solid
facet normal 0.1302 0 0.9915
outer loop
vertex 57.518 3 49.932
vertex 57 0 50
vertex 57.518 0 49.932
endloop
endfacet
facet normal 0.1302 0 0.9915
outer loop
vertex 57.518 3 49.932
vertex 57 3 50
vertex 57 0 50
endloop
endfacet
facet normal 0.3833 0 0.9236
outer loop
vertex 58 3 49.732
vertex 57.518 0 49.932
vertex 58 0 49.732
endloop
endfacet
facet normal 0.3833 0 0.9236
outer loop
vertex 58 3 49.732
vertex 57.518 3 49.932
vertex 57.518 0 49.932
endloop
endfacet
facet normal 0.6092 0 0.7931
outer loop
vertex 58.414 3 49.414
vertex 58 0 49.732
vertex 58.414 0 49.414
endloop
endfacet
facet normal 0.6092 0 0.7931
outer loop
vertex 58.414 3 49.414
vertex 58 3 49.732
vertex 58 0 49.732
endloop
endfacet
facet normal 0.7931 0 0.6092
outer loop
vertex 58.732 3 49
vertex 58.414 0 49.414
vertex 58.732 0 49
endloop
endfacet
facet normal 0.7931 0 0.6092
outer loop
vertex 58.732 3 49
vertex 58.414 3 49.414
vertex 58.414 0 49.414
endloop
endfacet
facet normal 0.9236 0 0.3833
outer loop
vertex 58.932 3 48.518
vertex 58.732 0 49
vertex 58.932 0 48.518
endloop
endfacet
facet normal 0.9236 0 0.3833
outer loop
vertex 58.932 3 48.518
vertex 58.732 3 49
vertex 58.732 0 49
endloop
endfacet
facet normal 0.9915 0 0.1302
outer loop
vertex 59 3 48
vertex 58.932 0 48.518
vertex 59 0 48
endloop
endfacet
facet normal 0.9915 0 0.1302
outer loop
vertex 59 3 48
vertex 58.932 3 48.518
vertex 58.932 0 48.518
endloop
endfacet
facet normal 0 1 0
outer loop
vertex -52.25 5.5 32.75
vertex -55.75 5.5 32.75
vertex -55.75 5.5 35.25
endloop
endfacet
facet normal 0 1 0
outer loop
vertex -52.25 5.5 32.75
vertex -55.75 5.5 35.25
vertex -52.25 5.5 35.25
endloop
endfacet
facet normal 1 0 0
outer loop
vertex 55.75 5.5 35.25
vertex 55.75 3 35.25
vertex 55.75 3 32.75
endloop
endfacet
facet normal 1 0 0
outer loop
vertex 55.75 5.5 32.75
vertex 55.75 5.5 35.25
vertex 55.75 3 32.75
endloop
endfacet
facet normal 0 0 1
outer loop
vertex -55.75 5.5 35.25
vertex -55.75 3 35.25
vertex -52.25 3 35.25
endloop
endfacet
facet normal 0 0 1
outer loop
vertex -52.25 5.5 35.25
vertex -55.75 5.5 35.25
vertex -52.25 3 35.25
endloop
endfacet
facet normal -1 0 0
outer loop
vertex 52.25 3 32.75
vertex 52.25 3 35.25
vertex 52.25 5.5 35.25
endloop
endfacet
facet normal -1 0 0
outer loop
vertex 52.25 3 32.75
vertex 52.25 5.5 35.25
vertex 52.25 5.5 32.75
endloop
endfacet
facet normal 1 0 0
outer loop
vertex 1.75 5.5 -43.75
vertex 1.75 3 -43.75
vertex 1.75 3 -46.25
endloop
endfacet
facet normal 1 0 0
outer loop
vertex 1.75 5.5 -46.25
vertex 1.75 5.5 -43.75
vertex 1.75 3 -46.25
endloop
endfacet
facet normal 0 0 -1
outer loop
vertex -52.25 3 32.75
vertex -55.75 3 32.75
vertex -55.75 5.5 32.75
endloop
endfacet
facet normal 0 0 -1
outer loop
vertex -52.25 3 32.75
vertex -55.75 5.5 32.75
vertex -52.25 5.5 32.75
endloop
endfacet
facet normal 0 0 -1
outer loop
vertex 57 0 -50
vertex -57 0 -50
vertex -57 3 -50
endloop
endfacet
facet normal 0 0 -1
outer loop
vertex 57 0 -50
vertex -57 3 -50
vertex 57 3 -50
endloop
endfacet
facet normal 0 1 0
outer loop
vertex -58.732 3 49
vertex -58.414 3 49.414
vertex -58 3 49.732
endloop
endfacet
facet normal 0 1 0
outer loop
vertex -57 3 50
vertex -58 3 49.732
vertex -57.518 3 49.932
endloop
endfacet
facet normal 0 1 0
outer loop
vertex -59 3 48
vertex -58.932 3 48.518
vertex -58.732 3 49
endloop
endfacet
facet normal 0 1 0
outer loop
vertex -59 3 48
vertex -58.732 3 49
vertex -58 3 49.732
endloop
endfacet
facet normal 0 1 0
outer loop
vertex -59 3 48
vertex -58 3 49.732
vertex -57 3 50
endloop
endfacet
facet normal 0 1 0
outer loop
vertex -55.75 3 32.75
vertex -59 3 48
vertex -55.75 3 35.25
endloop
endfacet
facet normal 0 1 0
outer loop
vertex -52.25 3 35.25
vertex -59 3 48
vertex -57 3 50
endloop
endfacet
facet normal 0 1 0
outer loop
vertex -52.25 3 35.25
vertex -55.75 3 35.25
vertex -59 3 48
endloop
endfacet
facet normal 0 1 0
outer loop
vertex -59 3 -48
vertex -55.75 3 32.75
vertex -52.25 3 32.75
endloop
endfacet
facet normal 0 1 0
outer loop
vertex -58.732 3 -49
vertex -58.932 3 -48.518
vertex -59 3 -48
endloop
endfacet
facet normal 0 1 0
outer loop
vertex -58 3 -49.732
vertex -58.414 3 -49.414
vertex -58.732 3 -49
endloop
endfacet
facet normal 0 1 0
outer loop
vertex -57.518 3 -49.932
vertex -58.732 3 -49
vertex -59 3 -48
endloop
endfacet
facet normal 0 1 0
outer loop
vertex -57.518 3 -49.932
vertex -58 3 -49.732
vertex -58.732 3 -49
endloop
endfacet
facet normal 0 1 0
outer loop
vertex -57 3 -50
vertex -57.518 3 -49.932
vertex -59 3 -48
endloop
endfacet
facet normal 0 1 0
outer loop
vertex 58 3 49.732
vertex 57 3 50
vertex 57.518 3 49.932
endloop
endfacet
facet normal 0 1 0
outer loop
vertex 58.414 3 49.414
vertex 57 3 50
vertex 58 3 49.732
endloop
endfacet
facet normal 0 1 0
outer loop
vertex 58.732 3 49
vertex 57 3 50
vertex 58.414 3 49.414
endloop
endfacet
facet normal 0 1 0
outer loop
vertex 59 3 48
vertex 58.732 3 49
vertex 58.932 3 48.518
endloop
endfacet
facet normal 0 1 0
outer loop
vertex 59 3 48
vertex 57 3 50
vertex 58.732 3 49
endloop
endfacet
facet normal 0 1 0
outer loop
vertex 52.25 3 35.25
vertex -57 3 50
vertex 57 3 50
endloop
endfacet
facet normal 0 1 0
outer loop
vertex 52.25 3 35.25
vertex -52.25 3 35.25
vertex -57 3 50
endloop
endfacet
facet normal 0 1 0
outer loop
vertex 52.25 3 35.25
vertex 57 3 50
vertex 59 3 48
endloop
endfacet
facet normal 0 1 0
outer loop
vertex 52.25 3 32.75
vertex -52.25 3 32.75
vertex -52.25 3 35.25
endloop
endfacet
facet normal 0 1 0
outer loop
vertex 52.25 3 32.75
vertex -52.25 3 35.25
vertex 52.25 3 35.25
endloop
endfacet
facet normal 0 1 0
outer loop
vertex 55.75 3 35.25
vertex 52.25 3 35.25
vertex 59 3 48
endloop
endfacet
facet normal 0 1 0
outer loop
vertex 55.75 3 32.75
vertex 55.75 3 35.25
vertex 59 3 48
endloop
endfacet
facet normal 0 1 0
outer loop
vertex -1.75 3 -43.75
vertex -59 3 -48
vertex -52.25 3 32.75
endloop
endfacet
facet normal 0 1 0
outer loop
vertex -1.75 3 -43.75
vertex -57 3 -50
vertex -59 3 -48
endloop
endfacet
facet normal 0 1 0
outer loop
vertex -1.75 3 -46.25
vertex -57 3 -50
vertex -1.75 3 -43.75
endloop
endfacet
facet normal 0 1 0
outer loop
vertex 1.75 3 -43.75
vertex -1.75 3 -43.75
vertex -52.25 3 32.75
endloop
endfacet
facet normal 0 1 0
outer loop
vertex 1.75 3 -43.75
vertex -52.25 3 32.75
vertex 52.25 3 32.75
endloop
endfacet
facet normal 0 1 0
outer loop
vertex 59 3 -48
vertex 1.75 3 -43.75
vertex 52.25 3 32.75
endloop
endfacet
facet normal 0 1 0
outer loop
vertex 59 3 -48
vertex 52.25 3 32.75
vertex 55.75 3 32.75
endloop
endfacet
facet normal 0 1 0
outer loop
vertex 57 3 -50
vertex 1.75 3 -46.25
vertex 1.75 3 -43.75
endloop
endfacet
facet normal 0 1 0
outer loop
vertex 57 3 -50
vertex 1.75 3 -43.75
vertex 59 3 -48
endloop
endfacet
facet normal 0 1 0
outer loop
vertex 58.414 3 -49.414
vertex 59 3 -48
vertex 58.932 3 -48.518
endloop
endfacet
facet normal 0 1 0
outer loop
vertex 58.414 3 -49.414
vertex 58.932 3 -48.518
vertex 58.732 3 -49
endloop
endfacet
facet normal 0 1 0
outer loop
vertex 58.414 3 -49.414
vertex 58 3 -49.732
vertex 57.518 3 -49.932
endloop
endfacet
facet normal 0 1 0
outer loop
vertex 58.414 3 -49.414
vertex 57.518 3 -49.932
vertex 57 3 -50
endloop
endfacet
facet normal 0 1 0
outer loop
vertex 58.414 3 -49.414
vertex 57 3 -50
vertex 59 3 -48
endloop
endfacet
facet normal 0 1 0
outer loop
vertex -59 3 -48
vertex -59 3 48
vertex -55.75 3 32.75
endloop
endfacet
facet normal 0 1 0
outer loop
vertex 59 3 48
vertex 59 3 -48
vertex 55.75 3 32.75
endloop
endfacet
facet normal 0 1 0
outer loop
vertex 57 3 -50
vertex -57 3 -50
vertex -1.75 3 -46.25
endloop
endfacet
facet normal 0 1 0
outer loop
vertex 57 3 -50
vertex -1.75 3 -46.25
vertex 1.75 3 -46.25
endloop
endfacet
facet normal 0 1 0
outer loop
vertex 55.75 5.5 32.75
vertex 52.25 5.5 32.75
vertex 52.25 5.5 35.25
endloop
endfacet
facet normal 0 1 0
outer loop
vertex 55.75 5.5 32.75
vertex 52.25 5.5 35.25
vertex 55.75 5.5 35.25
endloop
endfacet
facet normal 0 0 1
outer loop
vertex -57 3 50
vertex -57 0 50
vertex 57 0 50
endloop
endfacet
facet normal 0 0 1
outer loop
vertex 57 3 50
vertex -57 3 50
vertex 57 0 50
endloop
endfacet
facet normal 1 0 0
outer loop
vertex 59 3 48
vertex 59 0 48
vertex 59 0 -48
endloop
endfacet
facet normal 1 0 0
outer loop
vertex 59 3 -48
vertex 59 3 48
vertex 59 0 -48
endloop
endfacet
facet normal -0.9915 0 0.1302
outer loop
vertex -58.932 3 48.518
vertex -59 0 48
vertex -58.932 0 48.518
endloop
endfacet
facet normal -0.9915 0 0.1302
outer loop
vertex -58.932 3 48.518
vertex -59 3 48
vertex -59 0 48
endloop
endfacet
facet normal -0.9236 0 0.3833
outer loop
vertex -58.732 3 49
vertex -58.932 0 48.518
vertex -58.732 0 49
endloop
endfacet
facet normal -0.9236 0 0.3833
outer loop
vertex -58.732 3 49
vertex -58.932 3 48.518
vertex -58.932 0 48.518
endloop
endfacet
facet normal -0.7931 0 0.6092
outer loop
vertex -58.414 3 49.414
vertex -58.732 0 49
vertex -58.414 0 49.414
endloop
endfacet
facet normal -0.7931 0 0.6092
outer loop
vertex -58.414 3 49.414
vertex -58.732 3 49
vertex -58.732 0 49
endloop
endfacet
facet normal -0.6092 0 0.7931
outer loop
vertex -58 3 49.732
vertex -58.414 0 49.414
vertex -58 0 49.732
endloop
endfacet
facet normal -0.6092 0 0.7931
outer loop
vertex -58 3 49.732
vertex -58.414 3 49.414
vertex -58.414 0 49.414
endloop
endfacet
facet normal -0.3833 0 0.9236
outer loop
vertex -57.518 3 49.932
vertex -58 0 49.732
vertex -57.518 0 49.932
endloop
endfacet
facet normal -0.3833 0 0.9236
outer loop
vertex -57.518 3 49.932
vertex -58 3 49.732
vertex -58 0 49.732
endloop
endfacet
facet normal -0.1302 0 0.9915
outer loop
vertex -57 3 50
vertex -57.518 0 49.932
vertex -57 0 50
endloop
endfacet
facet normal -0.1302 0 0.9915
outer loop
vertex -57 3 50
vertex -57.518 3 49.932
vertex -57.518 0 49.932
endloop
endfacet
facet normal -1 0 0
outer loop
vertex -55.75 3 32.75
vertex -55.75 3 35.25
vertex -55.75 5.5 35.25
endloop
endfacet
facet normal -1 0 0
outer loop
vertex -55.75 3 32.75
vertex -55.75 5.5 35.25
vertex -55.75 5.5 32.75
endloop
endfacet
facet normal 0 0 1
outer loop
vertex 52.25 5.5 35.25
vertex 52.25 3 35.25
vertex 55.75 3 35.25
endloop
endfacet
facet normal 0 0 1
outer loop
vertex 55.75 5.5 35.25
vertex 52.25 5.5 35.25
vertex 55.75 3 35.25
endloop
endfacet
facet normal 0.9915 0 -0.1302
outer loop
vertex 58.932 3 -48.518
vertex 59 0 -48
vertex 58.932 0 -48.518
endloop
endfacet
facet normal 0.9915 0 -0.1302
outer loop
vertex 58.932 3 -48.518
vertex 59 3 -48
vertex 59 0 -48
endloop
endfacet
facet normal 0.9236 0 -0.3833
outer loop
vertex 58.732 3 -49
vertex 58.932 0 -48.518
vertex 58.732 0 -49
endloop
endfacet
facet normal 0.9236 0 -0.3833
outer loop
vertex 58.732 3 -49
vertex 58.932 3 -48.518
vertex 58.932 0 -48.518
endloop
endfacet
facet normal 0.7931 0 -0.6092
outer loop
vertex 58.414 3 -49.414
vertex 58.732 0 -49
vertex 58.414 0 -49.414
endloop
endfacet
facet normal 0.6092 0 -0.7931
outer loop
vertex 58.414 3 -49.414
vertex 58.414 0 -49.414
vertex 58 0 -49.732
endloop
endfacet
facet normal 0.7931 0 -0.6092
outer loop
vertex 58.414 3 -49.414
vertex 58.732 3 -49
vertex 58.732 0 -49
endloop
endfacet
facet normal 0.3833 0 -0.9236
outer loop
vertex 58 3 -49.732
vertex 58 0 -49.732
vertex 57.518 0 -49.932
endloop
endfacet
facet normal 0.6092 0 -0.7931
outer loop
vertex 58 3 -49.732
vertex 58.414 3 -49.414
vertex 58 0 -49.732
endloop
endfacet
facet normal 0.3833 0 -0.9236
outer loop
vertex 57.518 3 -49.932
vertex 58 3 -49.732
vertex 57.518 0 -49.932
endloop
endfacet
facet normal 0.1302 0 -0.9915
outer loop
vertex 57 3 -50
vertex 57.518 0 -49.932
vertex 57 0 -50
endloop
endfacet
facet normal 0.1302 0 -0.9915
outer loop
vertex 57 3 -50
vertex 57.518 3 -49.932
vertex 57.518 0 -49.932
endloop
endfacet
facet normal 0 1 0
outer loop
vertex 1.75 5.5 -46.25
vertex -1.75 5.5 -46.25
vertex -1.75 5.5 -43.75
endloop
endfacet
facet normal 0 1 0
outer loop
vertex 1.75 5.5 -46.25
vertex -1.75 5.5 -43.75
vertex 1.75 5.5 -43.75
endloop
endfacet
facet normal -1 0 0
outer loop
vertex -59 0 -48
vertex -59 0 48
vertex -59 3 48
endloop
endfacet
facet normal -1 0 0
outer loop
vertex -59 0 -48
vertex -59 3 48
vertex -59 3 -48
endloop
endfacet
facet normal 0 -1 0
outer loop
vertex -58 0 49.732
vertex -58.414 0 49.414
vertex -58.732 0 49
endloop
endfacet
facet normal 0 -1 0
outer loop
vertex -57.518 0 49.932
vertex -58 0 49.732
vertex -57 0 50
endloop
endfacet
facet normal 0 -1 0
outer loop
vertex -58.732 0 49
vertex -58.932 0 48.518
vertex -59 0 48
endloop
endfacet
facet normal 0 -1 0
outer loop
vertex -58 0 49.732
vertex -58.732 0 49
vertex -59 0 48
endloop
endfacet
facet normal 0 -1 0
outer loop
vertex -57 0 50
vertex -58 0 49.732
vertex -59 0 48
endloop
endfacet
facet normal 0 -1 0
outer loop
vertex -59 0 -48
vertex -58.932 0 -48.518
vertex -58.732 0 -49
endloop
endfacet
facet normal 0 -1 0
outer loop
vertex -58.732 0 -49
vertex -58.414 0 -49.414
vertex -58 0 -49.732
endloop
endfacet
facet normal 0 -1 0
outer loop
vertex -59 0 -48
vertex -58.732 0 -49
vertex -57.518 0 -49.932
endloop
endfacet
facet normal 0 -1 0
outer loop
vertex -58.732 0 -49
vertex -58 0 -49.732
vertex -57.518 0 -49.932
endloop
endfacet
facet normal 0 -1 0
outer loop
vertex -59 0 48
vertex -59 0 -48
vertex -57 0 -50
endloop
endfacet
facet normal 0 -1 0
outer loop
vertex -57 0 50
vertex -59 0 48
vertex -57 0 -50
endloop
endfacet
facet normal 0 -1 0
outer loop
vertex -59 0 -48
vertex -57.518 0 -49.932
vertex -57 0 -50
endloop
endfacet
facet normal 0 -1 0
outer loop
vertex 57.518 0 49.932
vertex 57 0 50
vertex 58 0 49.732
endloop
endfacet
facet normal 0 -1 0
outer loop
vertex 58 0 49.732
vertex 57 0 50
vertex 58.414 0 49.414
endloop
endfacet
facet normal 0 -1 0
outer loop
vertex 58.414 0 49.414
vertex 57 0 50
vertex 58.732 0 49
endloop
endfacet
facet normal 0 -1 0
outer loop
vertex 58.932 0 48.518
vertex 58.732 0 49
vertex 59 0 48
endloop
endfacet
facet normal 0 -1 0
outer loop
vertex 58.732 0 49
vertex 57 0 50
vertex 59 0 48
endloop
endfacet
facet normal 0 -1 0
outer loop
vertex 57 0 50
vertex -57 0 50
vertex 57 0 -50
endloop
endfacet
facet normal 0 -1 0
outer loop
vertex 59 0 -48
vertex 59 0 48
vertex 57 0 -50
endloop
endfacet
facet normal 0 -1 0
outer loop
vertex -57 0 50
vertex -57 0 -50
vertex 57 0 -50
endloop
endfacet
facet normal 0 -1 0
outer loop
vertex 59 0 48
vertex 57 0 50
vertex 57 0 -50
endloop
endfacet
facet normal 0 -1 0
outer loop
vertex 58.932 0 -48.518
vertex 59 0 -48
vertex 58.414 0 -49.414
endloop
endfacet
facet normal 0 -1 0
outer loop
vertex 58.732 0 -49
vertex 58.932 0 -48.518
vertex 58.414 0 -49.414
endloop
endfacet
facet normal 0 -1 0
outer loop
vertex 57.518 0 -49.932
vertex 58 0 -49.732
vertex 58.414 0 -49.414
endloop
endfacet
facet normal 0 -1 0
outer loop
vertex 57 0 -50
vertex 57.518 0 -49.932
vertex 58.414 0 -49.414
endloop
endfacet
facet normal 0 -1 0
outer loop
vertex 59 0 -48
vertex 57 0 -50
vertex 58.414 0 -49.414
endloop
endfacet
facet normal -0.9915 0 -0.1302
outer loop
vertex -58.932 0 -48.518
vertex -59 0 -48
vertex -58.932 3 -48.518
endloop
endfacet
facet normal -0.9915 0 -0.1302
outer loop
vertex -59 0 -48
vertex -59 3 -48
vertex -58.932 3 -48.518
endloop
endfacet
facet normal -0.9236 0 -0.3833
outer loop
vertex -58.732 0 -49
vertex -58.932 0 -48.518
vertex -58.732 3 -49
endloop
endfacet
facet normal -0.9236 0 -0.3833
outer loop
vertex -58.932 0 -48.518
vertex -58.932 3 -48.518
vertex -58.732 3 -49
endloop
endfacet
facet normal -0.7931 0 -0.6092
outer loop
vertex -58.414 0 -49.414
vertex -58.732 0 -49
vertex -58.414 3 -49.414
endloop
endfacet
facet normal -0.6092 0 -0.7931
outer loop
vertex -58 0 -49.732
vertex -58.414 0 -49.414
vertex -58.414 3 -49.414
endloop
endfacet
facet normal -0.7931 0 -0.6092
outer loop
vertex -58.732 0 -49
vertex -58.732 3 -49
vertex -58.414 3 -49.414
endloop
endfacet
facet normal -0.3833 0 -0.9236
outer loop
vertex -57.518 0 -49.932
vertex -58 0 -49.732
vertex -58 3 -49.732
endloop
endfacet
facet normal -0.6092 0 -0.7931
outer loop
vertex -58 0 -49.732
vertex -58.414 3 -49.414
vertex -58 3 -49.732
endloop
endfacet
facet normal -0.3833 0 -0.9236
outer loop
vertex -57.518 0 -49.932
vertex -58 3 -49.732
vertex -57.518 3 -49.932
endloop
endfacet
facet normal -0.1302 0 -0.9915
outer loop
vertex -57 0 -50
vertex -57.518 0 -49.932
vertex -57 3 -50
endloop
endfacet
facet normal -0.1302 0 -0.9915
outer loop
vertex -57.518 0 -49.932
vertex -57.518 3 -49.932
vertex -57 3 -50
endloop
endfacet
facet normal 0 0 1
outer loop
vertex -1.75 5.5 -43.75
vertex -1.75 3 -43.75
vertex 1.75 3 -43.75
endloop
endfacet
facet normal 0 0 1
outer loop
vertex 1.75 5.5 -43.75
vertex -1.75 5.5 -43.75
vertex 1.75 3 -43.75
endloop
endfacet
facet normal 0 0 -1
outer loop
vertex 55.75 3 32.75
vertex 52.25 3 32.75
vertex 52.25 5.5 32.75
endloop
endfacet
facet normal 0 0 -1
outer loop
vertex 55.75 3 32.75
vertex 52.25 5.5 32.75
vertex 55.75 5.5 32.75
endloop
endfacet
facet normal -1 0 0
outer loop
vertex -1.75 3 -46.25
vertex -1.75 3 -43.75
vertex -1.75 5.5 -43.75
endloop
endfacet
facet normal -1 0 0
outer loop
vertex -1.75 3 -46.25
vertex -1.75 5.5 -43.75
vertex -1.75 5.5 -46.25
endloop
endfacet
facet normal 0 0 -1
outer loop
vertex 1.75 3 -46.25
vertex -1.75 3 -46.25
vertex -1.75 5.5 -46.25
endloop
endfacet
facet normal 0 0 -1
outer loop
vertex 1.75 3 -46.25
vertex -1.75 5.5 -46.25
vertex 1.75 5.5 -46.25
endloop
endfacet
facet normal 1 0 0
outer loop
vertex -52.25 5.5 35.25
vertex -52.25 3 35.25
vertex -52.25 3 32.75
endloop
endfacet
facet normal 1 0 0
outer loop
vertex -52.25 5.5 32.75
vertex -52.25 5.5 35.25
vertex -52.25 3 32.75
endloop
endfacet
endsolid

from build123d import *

# Parameters (mm, degrees)
SKETCH1_W           = 118
SKETCH1_H           = 100
BOSS_EXTRUDE1_DEPTH = 3
FILLET1_R           = 2
SKETCH2_W           = 3.5
SKETCH2_H           = 2.5
BOSS_EXTRUDE2_DEPTH = 2.5


with BuildPart() as part:
    # Sketch1 → Boss-Extrude1 (new body)
    with BuildSketch(Plane(origin=(0, 0, 0), x_dir=(1, 0, 0), z_dir=(0, 1, 0))):
        Rectangle(SKETCH1_W, SKETCH1_H)
    extrude(amount=BOSS_EXTRUDE1_DEPTH)

    # Fillet1
    fillet1_edges = [part.edges().sort_by_distance(p)[0] for p in [
        (59, 1.5, 50),
        (-59, 1.5, 50),
        (-59, 1.5, -50),
        (59, 1.5, -50),
    ]]
    fillet(fillet1_edges, radius=FILLET1_R)

    # Sketch2 → Boss-Extrude2 (add)
    with BuildSketch(Plane(origin=(0, 3, 0), x_dir=(1, 0, 0), z_dir=(0, 1, 0))):
        with Locations((-54, -34)):
            Rectangle(SKETCH2_W, SKETCH2_H)
        with Locations((54, -34)):
            Rectangle(SKETCH2_W, SKETCH2_H)
        with Locations((0, 45)):
            Rectangle(SKETCH2_W, SKETCH2_H)
    extrude(amount=BOSS_EXTRUDE2_DEPTH)


solid = part.part
